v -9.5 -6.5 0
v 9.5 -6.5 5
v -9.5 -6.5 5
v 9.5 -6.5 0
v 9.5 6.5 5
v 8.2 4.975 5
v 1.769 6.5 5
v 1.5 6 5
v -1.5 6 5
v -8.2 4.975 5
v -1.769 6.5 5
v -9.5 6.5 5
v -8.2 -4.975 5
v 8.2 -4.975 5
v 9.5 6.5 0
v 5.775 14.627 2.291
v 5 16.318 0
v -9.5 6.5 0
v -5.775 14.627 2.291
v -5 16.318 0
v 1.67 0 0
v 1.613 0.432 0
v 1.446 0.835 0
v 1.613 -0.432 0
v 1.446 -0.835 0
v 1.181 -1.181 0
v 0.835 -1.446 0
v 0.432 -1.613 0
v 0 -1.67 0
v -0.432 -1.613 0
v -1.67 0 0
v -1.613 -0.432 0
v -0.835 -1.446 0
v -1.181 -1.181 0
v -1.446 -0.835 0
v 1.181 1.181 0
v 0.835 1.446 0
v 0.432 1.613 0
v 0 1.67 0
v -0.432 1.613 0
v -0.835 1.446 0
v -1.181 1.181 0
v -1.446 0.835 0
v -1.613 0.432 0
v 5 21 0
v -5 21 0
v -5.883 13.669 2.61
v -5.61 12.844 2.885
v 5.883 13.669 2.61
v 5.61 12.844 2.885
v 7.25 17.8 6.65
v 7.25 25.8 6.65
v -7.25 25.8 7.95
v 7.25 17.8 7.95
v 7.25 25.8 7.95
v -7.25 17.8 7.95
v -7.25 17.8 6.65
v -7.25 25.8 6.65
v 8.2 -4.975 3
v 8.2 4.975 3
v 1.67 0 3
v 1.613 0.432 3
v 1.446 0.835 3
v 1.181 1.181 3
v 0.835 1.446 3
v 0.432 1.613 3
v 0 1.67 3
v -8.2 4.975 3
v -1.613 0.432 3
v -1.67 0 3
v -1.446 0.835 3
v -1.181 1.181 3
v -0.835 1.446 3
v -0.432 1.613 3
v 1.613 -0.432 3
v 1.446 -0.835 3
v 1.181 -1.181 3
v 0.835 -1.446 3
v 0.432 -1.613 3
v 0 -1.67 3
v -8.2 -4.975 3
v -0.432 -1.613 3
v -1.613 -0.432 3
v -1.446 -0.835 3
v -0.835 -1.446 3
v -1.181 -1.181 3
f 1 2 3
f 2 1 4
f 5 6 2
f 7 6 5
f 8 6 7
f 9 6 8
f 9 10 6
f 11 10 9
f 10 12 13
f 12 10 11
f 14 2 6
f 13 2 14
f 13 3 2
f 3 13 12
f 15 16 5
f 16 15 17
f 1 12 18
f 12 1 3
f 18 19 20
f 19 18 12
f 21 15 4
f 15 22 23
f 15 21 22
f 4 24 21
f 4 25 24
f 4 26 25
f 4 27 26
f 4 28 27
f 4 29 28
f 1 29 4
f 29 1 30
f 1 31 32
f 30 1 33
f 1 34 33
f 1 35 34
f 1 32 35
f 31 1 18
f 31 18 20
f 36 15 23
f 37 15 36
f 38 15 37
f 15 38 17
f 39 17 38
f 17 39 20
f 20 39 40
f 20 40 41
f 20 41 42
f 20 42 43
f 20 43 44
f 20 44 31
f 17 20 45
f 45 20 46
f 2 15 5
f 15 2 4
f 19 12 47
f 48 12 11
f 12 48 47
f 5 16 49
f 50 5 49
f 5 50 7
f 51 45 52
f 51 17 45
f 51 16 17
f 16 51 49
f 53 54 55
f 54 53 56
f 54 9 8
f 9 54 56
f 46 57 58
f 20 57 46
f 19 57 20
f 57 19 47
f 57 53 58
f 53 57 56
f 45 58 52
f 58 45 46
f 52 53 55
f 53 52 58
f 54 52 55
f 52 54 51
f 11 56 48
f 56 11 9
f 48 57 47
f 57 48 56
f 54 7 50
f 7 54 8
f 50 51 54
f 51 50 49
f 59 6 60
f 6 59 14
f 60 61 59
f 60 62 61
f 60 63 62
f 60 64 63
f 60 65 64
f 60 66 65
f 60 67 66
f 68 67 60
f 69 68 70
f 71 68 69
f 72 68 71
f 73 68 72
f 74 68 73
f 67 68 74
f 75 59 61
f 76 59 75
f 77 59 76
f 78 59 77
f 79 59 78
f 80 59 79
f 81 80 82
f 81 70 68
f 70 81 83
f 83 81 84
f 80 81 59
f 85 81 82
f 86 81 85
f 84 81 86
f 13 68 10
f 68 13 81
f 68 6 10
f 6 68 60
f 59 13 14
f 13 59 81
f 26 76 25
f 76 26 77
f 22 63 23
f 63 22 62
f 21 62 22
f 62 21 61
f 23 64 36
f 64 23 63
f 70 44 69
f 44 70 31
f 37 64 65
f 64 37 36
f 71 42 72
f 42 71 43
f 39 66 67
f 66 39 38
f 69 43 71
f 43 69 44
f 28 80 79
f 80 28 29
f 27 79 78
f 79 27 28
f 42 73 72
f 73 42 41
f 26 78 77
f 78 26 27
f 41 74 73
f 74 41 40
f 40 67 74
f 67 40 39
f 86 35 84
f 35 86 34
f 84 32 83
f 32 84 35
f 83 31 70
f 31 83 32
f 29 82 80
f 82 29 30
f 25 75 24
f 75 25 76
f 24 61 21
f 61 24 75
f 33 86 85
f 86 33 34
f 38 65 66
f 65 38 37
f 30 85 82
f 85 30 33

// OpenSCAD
// file: needleProbe.scad
// sketch for low-impact surface probe switch
// Aaron Birenboim   06sep14

magRad=6;  // radius of magnet group

module magnetGroup(fuzz=0,disk=0) {
// not sure which orientation is better, try both?
diskMagnetRot = (disk>1)?[90,0,0]:[0,90,0];
 for(i=[-120,0,120]) rotate([0,0,i]) translate([0,-magRad,-0.6])
   if (disk) rotate(diskMagnetRot)
     cylinder(h=1+fuzz*1.1,r=1.5+fuzz,$fn=36,center=true);
   else
     sphere(2.94/2+fuzz,$fn=36);   // 3mm bucky balls
}

module magnetMount(notional=false,disk=false,fuzz=0) {
  // magnets for contacts and alignment
  if (notional) color([0,0.4,0.8]) magnetGroup(disk=disk);

  // magnet base
  difference() {
      translate([0,0,-3]) triPlate(3+7,8+magRad,13.5+magRad);
      triPlate(10,6+magRad,11.5+magRad);

    // skip this for actual printed model... 
    //   this is just to see insides easier for display
    if (notional)
      translate([0,0,0.4]) cylinder(r=7+magRad,h=10,$fn=6);
    else // hollow out for magnet spheres
      magnetGroup(disk=disk,fuzz=fuzz);

    translate([0,0,-4]) cylinder(r=.6+fuzz*1.5,h=5,$fn=9);

    // drill hole for magnet contact wire
    translate([0,-magRad-.3,0]) rotate([90,0,0])
      rotate([0,0,-30]) cylinder(r=0.8,h=6,$fn=3);

  }
}

module pinHead() {
    union() {  // head
      intersection() {
        translate([0,0,-1]) cube([2,2,2],center=true);
        scale([0.8,0.8,0.4]) sphere(1,$fn=36);
      }

    translate([0,0,-0.05]) cylinder(r=.32,h=10,$fn=24); // shaft
  }
}

module probeMount(notional=false,fuzz=0) {
  intersection() {  // main probe mount plate
    translate([0,0,1]) cube([20,20,3],center=true);  // cut off pin shafts above

    union() {
      if (notional) for(i=[-120,0,120]) rotate([0,0,i])
        translate([0,-magRad,-.05]) color([.5,.5,.6]) pinHead();

      difference() {
        //triPlate(1.5);  // main plate, fiberglass plastic, like PCB
        triPlate(1.5,4.5+magRad,10+magRad);  // main plate, fiberglass plastic, like PCB

        for(i=[-120,0,120]) rotate([0,0,i])  // pin holes
          translate([0,-magRad,-1]) cylinder(r=0.4+fuzz,h=5,$fn=8);
        translate([0,0,-1]) cylinder(r=0.4+fuzz,h=5,$fn=8);
      }
    }
  }

  if (notional) { // show probe pin for notional drawing
    translate([0,0,1.6])mirror([0,0,1]) color([.3,.3,.5]) pinHead();  // main probe
    translate([0,0,-8]) scale([1,1,2]) sphere(0.4,$fn=36);
  }
}

module triPlate(h=2,r1=8,r2=10) {
  rotate([0,0,30]) intersection() {
    cylinder(r=r1,h=h,$fn=3);
    translate([0,0,-0.1]) rotate([0,0,60]) cylinder(r=r2,h=h+0.2,$fn=3);
  }
}

%if(1) { // show assembled notional view
  /////////// main, in-place view
  magnetMount(1,disk=0);
  translate ([0,0,3]) probeMount(1);

  // case can be 3D printed or machined
  if(0) %translate([0,0,-4]) difference() {
    cylinder(r=7,h=10,$fn=60);
    translate([0,0,2]) cylinder(r=5.5,h=9,$fn=60);
  }

  color([.8,.4,.4]) { // wires
    translate([0,-8,0.2]) cube([0.5,10,0.5],center=true);
    rotate([60,0,60]) translate([0,10,-0.5]) cube([0.5,10,0.5],center=true);
    translate([0,-3,3.5]) rotate([0,0,-30]) cube([0.5,5.5,0.5]);
    translate([0,3,0.2]) cube([5.5,0.5,0.5],center=true);
  }
} // end of assembly view

// parts to be fabricated
translate([0,20, 0])
  //magnetMount(fuzz=0.25,disk=0);
  magnetMount(fuzz=0.4,disk=2);

%translate([20,0,-1]) probeMount(fuzz=0.4);
%translate([-20,0,-1]) { // cap
  difference() {
    triPlate(3,7.5+magRad,13+magRad);

    translate([0,0,2]) difference() {
      cylinder(r=14,h=4,$fn=6);
      translate([0,0,-1]) triPlate(6,6+magRad-0.3,11.5+magRad-0.3);
    }
    translate([0,0,-1]) cylinder(r=0.6,h=6,$fn=6); // pass-trough for probe plate contact
  }
}
// main file
use <needleProbe.scad>;

ew = 16.1+.3;
eh = 9.75+.2;
mountPlateThickness=3;
difference() {
  union() {
    hull() {
      translate([0,0,5/2]) cube([19,13,5],center=true);
      translate([0,18,0.5]) cube([8,1,1],center=true);
    }
    hull() {
      translate([0,21.8,7.3]) cube([14.5,8,1.3],center=true);
      translate([0,7,3]) cube([3,2,4],center=true);
      translate([0,16,0.5]) cube([10,10,1],center=true);
    }
  }
  translate([-ew/2,-eh/2,mountPlateThickness]) cube([ew,eh,5]);
  translate([0,0,-1]) cylinder(r=2.94/2+.2,h=9,$fn=24);
}

%translate([0,9.8/2,12+mountPlateThickness]) { // Z offset to nozzle center
  translate([0,25,0]) rotate([90,0,0]) cylinder(h=20,r=.2,$fn=4); // show where hot-end tip centerline is
  rotate([-90,0,0]) cylinder(h=4.5,r2=0.3,r1=4,$fn=24);
  translate([0,18,0]) rotate([90,0,0]) rotate([0,0,-60]) magnetMount(disk=2);
}
